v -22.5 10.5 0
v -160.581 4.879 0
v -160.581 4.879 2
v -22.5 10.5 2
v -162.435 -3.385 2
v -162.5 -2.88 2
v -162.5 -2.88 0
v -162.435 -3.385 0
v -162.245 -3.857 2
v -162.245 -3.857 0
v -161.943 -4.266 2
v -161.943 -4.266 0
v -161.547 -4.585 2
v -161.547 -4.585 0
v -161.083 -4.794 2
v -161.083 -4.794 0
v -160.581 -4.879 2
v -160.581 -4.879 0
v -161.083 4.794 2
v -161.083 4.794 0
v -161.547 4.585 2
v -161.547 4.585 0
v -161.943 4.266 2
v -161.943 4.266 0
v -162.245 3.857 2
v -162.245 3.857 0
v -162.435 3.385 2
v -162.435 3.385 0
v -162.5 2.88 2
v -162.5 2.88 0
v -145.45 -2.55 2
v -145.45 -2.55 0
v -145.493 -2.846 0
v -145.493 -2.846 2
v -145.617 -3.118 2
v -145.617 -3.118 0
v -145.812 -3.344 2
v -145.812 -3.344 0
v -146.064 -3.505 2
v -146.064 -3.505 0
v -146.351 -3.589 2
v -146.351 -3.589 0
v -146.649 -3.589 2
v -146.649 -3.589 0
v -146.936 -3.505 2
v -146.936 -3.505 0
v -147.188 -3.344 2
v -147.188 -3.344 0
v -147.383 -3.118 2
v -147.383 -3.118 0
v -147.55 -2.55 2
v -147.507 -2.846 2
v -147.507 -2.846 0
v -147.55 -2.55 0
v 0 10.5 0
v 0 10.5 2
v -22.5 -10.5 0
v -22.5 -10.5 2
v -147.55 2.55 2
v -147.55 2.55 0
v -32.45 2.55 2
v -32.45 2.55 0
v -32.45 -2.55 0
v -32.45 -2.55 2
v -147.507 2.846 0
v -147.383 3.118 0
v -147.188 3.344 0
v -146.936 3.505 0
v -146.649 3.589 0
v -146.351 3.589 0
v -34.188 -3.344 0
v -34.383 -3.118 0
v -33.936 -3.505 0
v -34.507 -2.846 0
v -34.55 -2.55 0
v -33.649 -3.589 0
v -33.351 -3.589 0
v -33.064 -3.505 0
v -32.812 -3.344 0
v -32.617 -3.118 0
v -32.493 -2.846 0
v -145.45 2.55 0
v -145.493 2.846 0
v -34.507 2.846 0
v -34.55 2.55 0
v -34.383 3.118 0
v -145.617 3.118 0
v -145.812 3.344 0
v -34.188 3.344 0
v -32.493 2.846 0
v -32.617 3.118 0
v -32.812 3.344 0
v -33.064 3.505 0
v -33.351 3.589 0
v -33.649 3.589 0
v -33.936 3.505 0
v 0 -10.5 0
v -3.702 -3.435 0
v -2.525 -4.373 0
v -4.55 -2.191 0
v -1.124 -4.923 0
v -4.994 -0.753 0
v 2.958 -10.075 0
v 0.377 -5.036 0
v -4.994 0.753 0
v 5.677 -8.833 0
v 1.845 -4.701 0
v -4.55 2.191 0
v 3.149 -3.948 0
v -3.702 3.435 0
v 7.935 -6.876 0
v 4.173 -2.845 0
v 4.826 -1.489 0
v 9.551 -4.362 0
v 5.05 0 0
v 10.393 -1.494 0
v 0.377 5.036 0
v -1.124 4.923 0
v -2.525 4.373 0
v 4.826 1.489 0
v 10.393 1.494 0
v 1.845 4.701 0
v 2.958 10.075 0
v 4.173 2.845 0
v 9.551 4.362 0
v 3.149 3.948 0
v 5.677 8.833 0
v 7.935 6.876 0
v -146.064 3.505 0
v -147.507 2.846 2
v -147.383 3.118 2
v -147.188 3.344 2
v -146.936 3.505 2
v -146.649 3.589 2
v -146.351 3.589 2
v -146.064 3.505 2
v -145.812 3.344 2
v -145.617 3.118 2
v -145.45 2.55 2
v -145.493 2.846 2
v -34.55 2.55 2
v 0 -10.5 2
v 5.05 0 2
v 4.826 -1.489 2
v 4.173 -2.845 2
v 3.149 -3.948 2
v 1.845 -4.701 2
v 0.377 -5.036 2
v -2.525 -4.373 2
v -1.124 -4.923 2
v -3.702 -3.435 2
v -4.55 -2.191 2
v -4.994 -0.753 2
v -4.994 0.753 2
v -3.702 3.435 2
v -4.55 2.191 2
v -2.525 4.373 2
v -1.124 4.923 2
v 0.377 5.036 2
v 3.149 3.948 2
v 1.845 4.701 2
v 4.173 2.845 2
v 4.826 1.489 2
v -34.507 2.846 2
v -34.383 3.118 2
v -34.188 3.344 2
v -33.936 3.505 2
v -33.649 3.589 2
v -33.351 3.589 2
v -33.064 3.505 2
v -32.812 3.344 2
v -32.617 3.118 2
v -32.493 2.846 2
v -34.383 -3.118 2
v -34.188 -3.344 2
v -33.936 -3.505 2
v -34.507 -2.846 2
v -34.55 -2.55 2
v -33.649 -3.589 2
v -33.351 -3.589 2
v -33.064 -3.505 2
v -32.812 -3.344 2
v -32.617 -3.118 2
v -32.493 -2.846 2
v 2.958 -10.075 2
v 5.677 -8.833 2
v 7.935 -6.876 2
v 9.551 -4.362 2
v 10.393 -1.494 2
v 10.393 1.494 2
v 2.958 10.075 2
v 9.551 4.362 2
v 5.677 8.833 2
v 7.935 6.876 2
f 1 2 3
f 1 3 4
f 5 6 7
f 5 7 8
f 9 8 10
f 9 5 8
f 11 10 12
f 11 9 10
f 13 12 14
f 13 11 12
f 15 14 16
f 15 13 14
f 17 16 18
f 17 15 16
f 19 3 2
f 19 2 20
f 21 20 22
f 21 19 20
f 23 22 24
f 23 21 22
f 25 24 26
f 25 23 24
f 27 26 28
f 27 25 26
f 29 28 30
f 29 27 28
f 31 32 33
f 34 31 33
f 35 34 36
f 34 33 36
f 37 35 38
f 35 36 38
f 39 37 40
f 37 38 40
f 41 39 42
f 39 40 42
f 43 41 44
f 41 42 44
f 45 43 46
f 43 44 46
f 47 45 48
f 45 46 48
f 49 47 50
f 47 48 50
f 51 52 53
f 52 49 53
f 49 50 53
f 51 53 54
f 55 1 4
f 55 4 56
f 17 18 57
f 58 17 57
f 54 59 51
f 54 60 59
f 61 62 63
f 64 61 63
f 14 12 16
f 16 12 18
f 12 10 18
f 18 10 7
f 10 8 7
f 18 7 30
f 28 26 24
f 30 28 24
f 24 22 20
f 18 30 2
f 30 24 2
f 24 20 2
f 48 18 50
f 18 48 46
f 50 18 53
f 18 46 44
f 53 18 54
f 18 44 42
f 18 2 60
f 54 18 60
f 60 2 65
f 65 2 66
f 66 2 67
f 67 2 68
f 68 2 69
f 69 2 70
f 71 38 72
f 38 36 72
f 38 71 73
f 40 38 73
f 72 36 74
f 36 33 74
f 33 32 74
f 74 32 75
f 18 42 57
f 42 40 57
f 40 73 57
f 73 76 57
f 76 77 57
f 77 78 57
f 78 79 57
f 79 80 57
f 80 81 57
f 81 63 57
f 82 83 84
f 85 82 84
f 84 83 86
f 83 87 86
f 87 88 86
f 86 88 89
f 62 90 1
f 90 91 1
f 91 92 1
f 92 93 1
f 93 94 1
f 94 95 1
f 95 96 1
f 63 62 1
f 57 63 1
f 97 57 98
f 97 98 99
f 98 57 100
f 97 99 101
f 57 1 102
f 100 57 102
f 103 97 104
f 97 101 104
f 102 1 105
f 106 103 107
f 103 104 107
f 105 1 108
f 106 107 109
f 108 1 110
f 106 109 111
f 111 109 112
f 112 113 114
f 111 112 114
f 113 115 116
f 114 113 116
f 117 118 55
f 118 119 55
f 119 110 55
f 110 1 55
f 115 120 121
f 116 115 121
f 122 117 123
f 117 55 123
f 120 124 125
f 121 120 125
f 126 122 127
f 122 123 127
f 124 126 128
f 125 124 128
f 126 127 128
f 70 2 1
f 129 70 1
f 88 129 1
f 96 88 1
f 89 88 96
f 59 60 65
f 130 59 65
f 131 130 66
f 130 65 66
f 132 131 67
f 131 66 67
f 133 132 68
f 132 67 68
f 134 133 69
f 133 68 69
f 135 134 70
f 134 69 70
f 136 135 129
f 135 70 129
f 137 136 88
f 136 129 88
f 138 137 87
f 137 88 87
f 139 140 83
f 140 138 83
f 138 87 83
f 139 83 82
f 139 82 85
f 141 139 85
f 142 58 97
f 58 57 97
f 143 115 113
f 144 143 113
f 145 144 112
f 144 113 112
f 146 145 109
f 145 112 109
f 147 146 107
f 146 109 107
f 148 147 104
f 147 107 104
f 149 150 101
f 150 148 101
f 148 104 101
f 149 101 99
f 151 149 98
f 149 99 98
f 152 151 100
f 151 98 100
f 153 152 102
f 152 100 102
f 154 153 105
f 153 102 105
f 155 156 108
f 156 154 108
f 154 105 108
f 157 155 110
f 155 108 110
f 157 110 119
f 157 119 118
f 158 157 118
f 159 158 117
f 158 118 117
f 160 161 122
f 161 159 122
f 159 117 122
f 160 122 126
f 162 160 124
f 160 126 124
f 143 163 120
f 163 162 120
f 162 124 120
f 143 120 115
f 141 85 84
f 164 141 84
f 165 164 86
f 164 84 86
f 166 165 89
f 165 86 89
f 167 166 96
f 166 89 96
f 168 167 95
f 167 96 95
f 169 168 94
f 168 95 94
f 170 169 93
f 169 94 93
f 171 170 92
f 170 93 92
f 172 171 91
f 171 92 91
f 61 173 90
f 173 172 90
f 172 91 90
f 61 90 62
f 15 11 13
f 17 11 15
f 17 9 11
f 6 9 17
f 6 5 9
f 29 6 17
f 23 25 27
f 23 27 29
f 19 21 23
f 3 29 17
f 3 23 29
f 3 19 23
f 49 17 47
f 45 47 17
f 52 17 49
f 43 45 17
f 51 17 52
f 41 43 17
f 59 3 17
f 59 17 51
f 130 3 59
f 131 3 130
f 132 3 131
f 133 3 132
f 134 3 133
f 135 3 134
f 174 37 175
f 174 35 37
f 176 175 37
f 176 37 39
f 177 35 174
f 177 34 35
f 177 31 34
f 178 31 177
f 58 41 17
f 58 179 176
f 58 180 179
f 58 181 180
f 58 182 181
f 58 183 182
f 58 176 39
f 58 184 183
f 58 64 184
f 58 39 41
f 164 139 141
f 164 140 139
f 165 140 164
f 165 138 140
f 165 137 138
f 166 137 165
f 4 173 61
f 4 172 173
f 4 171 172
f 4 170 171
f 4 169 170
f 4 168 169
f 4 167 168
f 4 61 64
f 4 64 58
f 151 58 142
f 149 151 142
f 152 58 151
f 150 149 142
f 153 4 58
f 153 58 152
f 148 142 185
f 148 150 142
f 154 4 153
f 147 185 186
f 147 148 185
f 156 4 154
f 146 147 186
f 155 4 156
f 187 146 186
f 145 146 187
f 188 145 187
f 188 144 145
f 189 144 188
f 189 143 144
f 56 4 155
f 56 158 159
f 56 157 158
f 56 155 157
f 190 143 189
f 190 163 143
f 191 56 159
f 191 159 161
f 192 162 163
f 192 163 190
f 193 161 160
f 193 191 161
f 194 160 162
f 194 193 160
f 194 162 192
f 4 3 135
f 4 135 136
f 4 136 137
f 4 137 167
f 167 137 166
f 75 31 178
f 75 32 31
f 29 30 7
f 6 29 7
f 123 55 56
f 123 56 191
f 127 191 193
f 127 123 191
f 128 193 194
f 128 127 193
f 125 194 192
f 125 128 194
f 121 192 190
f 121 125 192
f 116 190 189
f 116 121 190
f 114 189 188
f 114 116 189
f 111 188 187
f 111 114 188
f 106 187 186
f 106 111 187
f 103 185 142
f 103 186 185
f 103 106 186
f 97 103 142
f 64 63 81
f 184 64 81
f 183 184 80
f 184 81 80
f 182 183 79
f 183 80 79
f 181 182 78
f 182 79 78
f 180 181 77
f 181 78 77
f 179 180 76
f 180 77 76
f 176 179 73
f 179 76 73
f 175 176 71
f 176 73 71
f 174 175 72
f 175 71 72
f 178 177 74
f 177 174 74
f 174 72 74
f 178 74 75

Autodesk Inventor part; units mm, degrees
ref_plane "YZ Plane" through (0, 0, 0) normal (1, 0, 0) x (0, 1, 0)
ref_plane "XZ Plane" through (0, 0, 0) normal (0, 1, 0) x (-1, 0, 0)
ref_plane "XY Plane" through (0, 0, 0) normal (0, 0, 1) x (1, 0, 0)
sketch "スケッチ1" plane through (0, 0, 0) normal (0, 0, 1) x (1, 0, 0)
  circle A0 centre (0, 0) radius 10.5 construction
  line L0 (0, 10.5) -> (-162.5, 10.5) construction
  line L1 (-162.5, 10.5) -> (-162.5, -10.5) construction
  line L2 (-162.5, -10.5) -> (0, -10.5) construction
  circle A1 centre (-157.5, 0) radius 1.55
  line L3 (-147.5, 2.5) -> (-32.5, 2.5) construction
  line L4 (-32.5, 2.5) -> (-32.5, -2.5) construction
  line L5 (-32.5, -2.5) -> (-147.5, -2.5) construction
  line L6 (-147.5, -2.5) -> (-147.5, 2.5) construction
  line L7 (-90, 2.5) -> (-90, -2.5) construction
  circle A2 centre (-22.5, 0) radius 1.55
  line L8 (-12, 21.3027) -> (-12, -27.3903) construction
  line L9 (-32.45, 2.55) -> (-147.55, 2.55) construction
  line L10 (-147.55, 2.55) -> (-147.55, -2.55) construction
  line L11 (-147.55, -2.55) -> (-32.45, -2.55) construction
  line L12 (-32.45, -2.55) -> (-32.45, 2.55) construction
  circle A3 centre (-146.5, 2.55) radius 1.05 construction
  line L13 (-147.5, 0) -> (-90, 0) construction
  line L14 (-147.55, 2.55) -> (-147.55, -2.55)
  arc A4 (-145.45, 2.55) -> (-147.55, 2.55) centre (-146.5, 2.55) ccw
  line L15 (-145.45, 2.55) -> (-34.55, 2.55)
  arc A5 (-32.45, 2.55) -> (-34.55, 2.55) centre (-33.5, 2.55) ccw
  line L16 (-32.45, 2.55) -> (-32.45, -2.55)
  arc A6 (-147.55, -2.55) -> (-145.45, -2.55) centre (-146.5, -2.55) ccw
  line L17 (-145.45, -2.55) -> (-34.55, -2.55)
  arc A7 (-34.55, -2.55) -> (-32.45, -2.55) centre (-33.5, -2.55) ccw
  circle A8 centre (0, 8.5) radius 1.35
  circle A9 centre (0, 0) radius 5.05
  circle A10 centre (-8.5, 0) radius 1.35
  circle A11 centre (0, -8.5) radius 1.35
  circle A12 centre (8.5, 0) radius 1.35
  line L18 (-162.5, 4.8006) -> (-162.5, -4.8006)
  line L19 (-162.5, 4.8006) -> (-22.5, 10.5)
  line L20 (-22.5, 10.5) -> (0, 10.5)
  line L21 (-162.5, -4.8006) -> (-22.5, -10.5)
  line L22 (-22.5, -10.5) -> (0, -10.5)
  arc A13 (0, -10.5) -> (0, 10.5) centre (0, 0) ccw
  circle A14 centre (-157.5, 0) radius 5 construction
  point P0 (-162.5, 0)
  dimension "d9" = 2.1
  dimension "d0" = 162.5
  dimension "d1" = 3.1
  dimension "d2" = 21
  dimension "d3" = 10
  dimension "d4" = 5
  dimension "d5" = 12
  dimension "d6" = 135
  dimension "d7" = 5
  dimension "d8" = 0.05
  dimension "d10" = 2.7
  dimension "d11" = 8.5
  dimension "d12" = 10.1
  dimension "d15" = 360
extrude "押し出し1" add sketch "スケッチ1" along normal blind 2
fillet "フィレット1" radius 2 2 edges at (-162.5, -4.8006, 1) (-162.5, 4.8006, 1)
sketch "スケッチ2" plane through (0, 0, 0) normal (0, 0, -1) x (-1, 0, 0)
  circle A0 centre (22.5, 0) radius 1.55 projected
  circle A1 centre (22.5, 0) radius 1.55
  circle A2 centre (8.5, 0) radius 1.35 projected
  circle A3 centre (8.5, 0) radius 1.35
  circle A4 centre (0, -8.5) radius 1.35 projected
  circle A5 centre (0, -8.5) radius 1.35
  circle A6 centre (-8.5, 0) radius 1.35 projected
  circle A7 centre (-8.5, 0) radius 1.35
  circle A8 centre (0, 8.5) radius 1.35 projected
  circle A9 centre (0, 8.5) radius 1.35
  circle A10 centre (157.5, 0) radius 1.55 projected
  circle A11 centre (157.5, 0) radius 1.55
  point P0 (0, 0)
extrude "押し出し2" add sketch "スケッチ2" against normal up to surface (2 mm away)
equation "\"H_head\" = 28.5"
equation "\"H_leg\" = 199.5"
equation "\"足の面積\" = 12720.125"
equation "\"現在の面積\" = 11560"
equation "\"足_短辺\" = 68"
equation "\"円柱\" = 313.5"
equation "\"胴体中心から手先\" = 342"
equation "\"H_leg_1\" = 186.2"
equation "\"H_leg_MAX\" = 399"
equation "\"H_head_1\" = 26.6"
equation "\"H_head_MAX\" = 142.5"
properties part number "前腕_メインフレーム_1_1" material "GFRP"
